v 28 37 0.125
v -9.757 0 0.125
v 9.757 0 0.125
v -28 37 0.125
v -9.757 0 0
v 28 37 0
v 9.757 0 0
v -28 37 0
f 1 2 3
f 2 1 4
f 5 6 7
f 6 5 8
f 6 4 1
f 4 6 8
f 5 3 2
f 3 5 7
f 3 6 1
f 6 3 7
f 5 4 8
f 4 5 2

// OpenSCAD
// file: modus.scad
//Corner Joint - allows the sides of two parts to create inlayed corner. Aids with welding.
//need to verify module math is the same throughout all parts.

module cornerjoint(Z,L,H,EndGap,PadL,PadH,CJangle,CJcenter){
    //change so that H = Z of inlayed part (usually 0.5)
    //add center and angle in degrees option, orgin far side of cut out area

     if((CJangle==0)&&(CJcenter==0))
      {    
        translate([0,0,0])
        rotate([0,0,CJangle])
        difference(){
        cube([L,H+PadH,Z]);
        translate([EndGap,H,0])
        cube([PadL,PadH,Z]);
        translate([L-EndGap-PadL,H,0])
        cube([PadL,PadH,Z]);}
      }    
else if((CJangle==90)&&(CJcenter==0))
      {    
        translate([H+PadH,0,0])
        rotate([0,0,CJangle])
        difference(){
        cube([L,H+PadH,Z]);
        translate([EndGap,H,0])
        cube([PadL,PadH,Z]);
        translate([L-EndGap-PadL,H,0])
        cube([PadL,PadH,Z]);}
      }
else if((CJangle==180)&&(CJcenter==0))       
      {    
        translate([L,H+PadH,0])
        rotate([0,0,CJangle])
        difference(){
        cube([L,H+PadH,Z]);
        translate([EndGap,H,0])
        cube([PadL,PadH,Z]);
        translate([L-EndGap-PadL,H,0])
        cube([PadL,PadH,Z]);}
      }
else if((CJangle==270)&&(CJcenter==0))
      {    
        translate([0,L,0])
        rotate([0,0,CJangle])
        difference(){
        cube([L,H+PadH,Z]);
        translate([EndGap,H,0])
        cube([PadL,PadH,Z]);
        translate([L-EndGap-PadL,H,0])
        cube([PadL,PadH,Z]);}
      }  
      
//centered     
   
else if((CJangle==0)&&(CJcenter==1))
      {    
        translate([-L/2,0,0])
        rotate([0,0,CJangle])
        difference(){
        cube([L,H+PadH,Z]);
        translate([EndGap,H,0])
        cube([PadL,PadH,Z]);
        translate([L-EndGap-PadL,H,0])
        cube([PadL,PadH,Z]);}
      }  
else if((CJangle==90)&&(CJcenter==1))
      {    
        translate([0,-L/2,0])
        rotate([0,0,CJangle])
        difference(){
        cube([L,H+PadH,Z]);
        translate([EndGap,H,0])
        cube([PadL,PadH,Z]);
        translate([L-EndGap-PadL,H,0])
        cube([PadL,PadH,Z]);}
      }
else if((CJangle==180)&&(CJcenter==1))       
      {    
        translate([L/2,0,0])
        rotate([0,0,CJangle])
        difference(){
        cube([L,H+PadH,Z]);
        translate([EndGap,H,0])
        cube([PadL,PadH,Z]);
        translate([L-EndGap-PadL,H,0])
        cube([PadL,PadH,Z]);}
      }
else if((CJangle==270)&&(CJcenter==1))
      {    
        translate([0,L/2,0])
        rotate([0,0,CJangle])
        difference(){
        cube([L,H+PadH,Z]);
        translate([EndGap,H,0])
        cube([PadL,PadH,Z]);
        translate([L-EndGap-PadL,H,0])
        cube([PadL,PadH,Z]);}
      }
} //end cornerjoint module

//Tab Insert - used to cut a hole for an abutting part to insert into. Typically aids with welding the two parts.
module tabinsert(X,Y,Z,dGap,cGap,c1,c2,c3,c4,c5,c6,c7,c8,center){
    translate([-dGap-(center*(X/2)),-dGap-(center*(Y/2)),0]){
        //main cut
        cube([X+(dGap*2),Y+(dGap*2),Z]);
        //corner c1c2
        translate([-cGap,(Y+(dGap*2))-c1+cGap,0])
            {
        cube([c2,c1,Z]);}
       //corner c3c4
       translate([(X+(dGap*2))-c3+cGap,(Y+(dGap*2))-c4+cGap,0]){
           cube([c3,c4,Z]);
       }
       //corner c5c6
       translate([(X+(dGap*2))-c6+cGap,-cGap,0])
      {
          cube([c6,c5,Z]);
      }
       
       //corner c7c8 
       translate([-cGap,-cGap,0]){
           cube([c7,c8,Z]);
       }
    
    } //end center translate
} //end tabinsert module
 

module nut(flattoflat,nutheight){  //distance from one flat side to the other flat side "A/F"

//typical sizes found here:
//https://en.wikipedia.org/wiki/Nut_(hardware)

difference(){
    translate([0,0,nutheight/2])
cube(size = [10,10,nutheight], center = true);
    
for(i=[1:6]){
    rotate([0,0,i*60])
difference(){
    translate([-10,0,0])
    cube([20,20,nutheight]);
    translate([-10,0,0])
    cube([20,flattoflat/2,nutheight]);
}  //end difference
}  //end for
}  //end differeence
}  //end module
// file: vars.scad
brickW=6; 
brickL=24;
brickCH=6; //Is brick height being shortened by d1z??

//3.625 x 2.25 x 8
//6 x 12 x 6

grateX=56;
grateY=23;
grateH=37; //Height mounted above press's frame
grateA=17.5; //angle of grate

//grateX=56;
//grateY=23;
//grateH=37; //Height mounted above press's frame
//grateA=17.5; //angle of grate


$fn=8; //defines resolution of circles. 8 is okay for review. 100  or greater should be used for for final dxf export.

dZstandard=0.5; //thickness of steel to be cut for drawer parts
fZstandard=0.5;
aZstandard=0.5; //thickness of steel to be cut for arm parts
hZstandard=0.125;

fBOLTHOLEstandardD=1; //standard bolts used on frame
aBOLTHOLEstandardD=1;

sliderodholeOD=1.2; 
d1bushingOD=1.25;
d1bushingL=1.25;
d1shaftOD=1;
d1bolt1OD=1;
d1bolt2OD=0.75;
d1nut2AF=1.25;
d1nut2H=0.665;


dGap=0.03125; //gap between a hole cut's edge and the part sitting within the hole. //D3 appears to use 0.3125, is this in error?

//all parts set to standard thickness below
//off standard preferences can be defined below

//drawer
drawergap=0.0283;  //extra room for drawer to slide in the space between f1 and f4
drawerHgap=0.1884;  //total extra space from drawer sides to frame walls. sum of both sides.

d2clevispinaccessholeOD=3;

d1z=dZstandard;
d2z=dZstandard;
d3z=dZstandard;
d4z=dZstandard;
d5z=dZstandard;
d6z=dZstandard;
d5z=dZstandard;
d7z=dZstandard;
d8z=dZstandard;
d9z=dZstandard;

d11z=dZstandard;
d12z=dZstandard;


//frame

f1y=6;
f1z=fZstandard;


f2y=3.5;
f2z=fZstandard;

f3y=3.5;
f3z=fZstandard;

f4y=11;
f4z=fZstandard;

f5y=3.5;
f5z=fZstandard;

f6y=8;
f6z=fZstandard;

f8y=brickW;
f8z=fZstandard;
f8boltD=1;

f9y=4.5;

f9z=fZstandard;




f12z=fZstandard;   

f11x=1.25;
f11z=fZstandard;

f13z=fZstandard;

f14y=3.5;
f14z=fZstandard;

//arms

a1x=4;
a1z=aZstandard;
a1out=24; //length from frame to A5 edge for bricks to sit on as they exit

a2x=6;
a2z=aZstandard;

a3x=4;
a3y=72;
a3z=aZstandard;

a4x=6;
a4y=72;
a4z=aZstandard;

a5x=6;
a5y=72;
a5z=aZstandard;

a6z=aZstandard;

//guards

h1x=grateX;
h1y=grateH;  //might need to tweak for grate thickness

h1z=hZstandard;
h2z=hZstandard;
h3z=hZstandard;
h4z=hZstandard;
h5z=hZstandard;
h6z=hZstandard;
h7z=hZstandard;
h8z=hZstandard;

//
//Input your main cylinder's dimenions here
//
cylMainBore = 5;
cylMainStroke = 16;
cylMainExt = 43;
cylMainRet = 27;
cylMainA = (cylMainRet-cylMainStroke); //center to center minus stroke length
cylMainB = 0.25; // cylinder wall thickness
cylMainD = 2.5; //Rod OD
cylMainE = 5.75; //rear pin holder width
cylMainG = 4; //rod pin holder width
cylMainJ = 3.8; //distance from the end of the cylinder body to rod pin center
cylMainR = 1.52; //pin hole ID
cylMainS = 2.5; //pin holder OD

//
//Input your drawer cylinder's dimenions here
//
//
cylDrawerBore = 5;
cylDrawerStroke = 16;
cylDrawerExt = 43;
cylDrawerRet = 27;
cylDrawerA = (cylMainRet-cylMainStroke); //center to center minus stroke length
cylDrawerB = 0.25; // cylinder wall thickness
cylDrawerD = 2.5; //Rod OD
cylDrawerE = 5.75; //rear pin holder width
cylDrawerG = 4; //rod pin holder width
cylDrawerJ = 3.8; //distance from the end of the cylinder body to rod pin center
cylDrawerR = 1.52; //pin hole ID
cylDrawerS = 2.5; //pin holder OD

cylinderDRAWERbodyH=3; //measured when in position, largest length from top to bottom of cylinder
cylinderDRAWERminC2C=0; //drawer's hydraulic cylinder's distance from the center of one mounting hole to the center of the other when fully compressed.
cylinderDRAWERmaxC2C=0; ///drawer's hydraulic cylinder's distance from the center of one mounting hole to the center of the other when fully extended.
cylinderDRAWERrodclevisW=2.5; //width of cylinders' clevis on end of rod
cylinderDRAWERrodclevisID=1;
cylinderDRAWERrodclevisOD=2;
cylinderDRAWERrearclevisW=2.5; //width of mounting clevis cylinder body
cylinderDRAWERrearclevisID=1;
cylinderDRAWERrearclevisOD=2;
cylinderDRAWERrearclevisClearance=3; //usable space around rear clevis pin (in diameter). be aware of hyraulic fittings.

//the following variables are calculated in order of dependence on preceding variables

d3x=brickL+(d2z*2);
d3y=brickCH-d1z;
d4x=brickW+d3z+d3z;
d4y=brickCH-d1z;
d5x=brickL+(d2z*2);
d5y=brickW;
d6x=brickL+(d2z*2);
d6y=brickCH;
d7x=cylinderDRAWERrearclevisClearance;
d7y=a4z+d8z+cylinderDRAWERbodyH;
d9x=cylinderDRAWERbodyH+d6z; //should be based on clevis size?
d9y=cylinderDRAWERbodyH+d8z;
d8x=brickL+(d2z*2);
d8y=max(5,(d9x-d6z));   //need to review fundamentals, 5 minimun unless d9 gets larger than d8
d11x=1.5+(d1bolt1OD*2)+d1bushingOD;
d11y=max((0.5+d1bushingL),4);

d12x=d8x;
d12y=d11y+1;

f1x=((brickL+(d2z*2)+drawerHgap+(f9y*2)));
f3x=f1x;

d1x=(brickL+d2z+d2z);
//d1x=(((f1x/2)-(((brickL+(d2z*2)+drawerHgap)/2)-fZstandard-(sliderodholeOD/2)))+(d11x/2))*2;
d1y=((brickW+d3z+d3z)*3)+1;

d2x=d8y+d6z+brickW+d3z+d5y+d3z;
d2y=brickCH;



f11y=f8y;
f6x=brickL+(d2z*2)+(f9y*2)+drawerHgap;

f9x=(f2z+((cylMainS+0.125)/2)+cylMainRet-cylMainJ+1+f4y+drawergap+d2y+f1y);  //leaves 1" between top of cylinder and bottom of F4
f8x=f9x;


f2x=brickL+(d2z*2)+drawerHgap+(f9y*2)-(1.4*2);  //distance between large cut outs in f9

f5x=brickL+(d2z*2)+drawerHgap+(f9y*2)+(a1x*2); //distance between outer edges of each A1

f4x=f5x-0.5;   //same as f5 but minus 0.25 on each side to give a little overhang

f14x=brickL+(1*2)+(.125*2)+(dGap*2); 

f12x=f3x;
f12y=(f3y*2)+brickW;

sliderodoffset=(((brickL+(d2z*2)+drawerHgap)/2)-fZstandard-(sliderodholeOD/2));

distancetof8center=(cylDrawerExt+(a4x/2)+((d9x-d6z)/2)+d6z+(brickW/2)); //F8 center on A1

a1y=distancetof8center+(brickW/2)+a1out;
a2y=a1y;

h7x=f5x-((a1x/2)*2)+(1.5*2);
h7y=cylDrawerStroke;

h8x=f5x-((a1x/2)*2)+(1.5*2);
h8y=a1out-a5x-f5y;  //distance between a5 and f5

hopperBaseX=brickL;
hopperBaseY=brickW;

h2x=grateX;
h2y=sqrt(((h1y-(sin(grateA)*grateY))*(h1y-(sin(grateA)*grateY)))+(((cos(grateA)*grateY)-hopperBaseY)*((cos(grateA)*grateY)-hopperBaseY)));

//h1y-(sin(grateA)*grateY)
//(cos(grateA)*grateY)-hopperBaseY

echo(h1y-(sin(grateA)*grateY));
echo((cos(grateA)*grateY)-hopperBaseY);
echo(h2y);
echo(atan((h1y-(sin(grateA)*grateY))/((cos(grateA)*grateY)-hopperBaseY)));
echo((h1y-(sin(grateA)*grateY))/(h1y));

// ECHO - REQUIRED PARTS BASED ON INPUTS

echo(str("Minimum drawer cylinder stroke length: ",(d3z*2)+d5y+brickW));
//would be cool to validate and confirm user inputed stroke length. set error=1; if drawer cylinder is not long enough. print an echo warning.

echo(str("Grate hieght above ground level: ",(1)));
// main file
include <vars.scad>;
use <modus.scad>;

h1p();

module h1p(){
    
hopperBaseS=hopperBaseX*((h1y-(sin(grateA)*grateY))/(h1y));
    
difference(){
    
translate([-(h1x/2),0,0])
cube([h1x,h1y,h1z]);    
translate([-(h1x/2),0,0])
cuts();
translate([(h1x/2),0,0])
mirror([1,0,0])
cuts();
} //end difference

module cuts(){

//angle of h2
//atan((h1y-(sin(grateA)*grateY))/((cos(grateA)*grateY)-hopperBaseY))

//z vector of h2 in assembly position
echo(sin(atan((h1y-(sin(grateA)*grateY))/((cos(grateA)*grateY)-hopperBaseY)))*h2y);    

//amount of x cut on one half of h2
//((h2x-hopperBaseX)/2)

//angle in the z-x plane
    echo("test");
echo(atan(((sin(atan((h1y-(sin(grateA)*grateY))/((cos(grateA)*grateY)-hopperBaseY)))*h2y))/(((h2x-hopperBaseX)/2))));

//draw someething at this angle

//h1x-(new x)

echo("new x");
echo(h1y/tan((atan(((sin(atan((h1y-(sin(grateA)*grateY))/((cos(grateA)*grateY)-hopperBaseY)))*h2y))/(((h2x-hopperBaseX)/2))))));
    

echo("new base");    
echo(h1x-((h1y/tan((atan(((sin(atan((h1y-(sin(grateA)*grateY))/((cos(grateA)*grateY)-hopperBaseY)))*h2y))/(((h2x-hopperBaseX)/2)))))))*2);    

//sin(atan(h1y/((h1x-hopperBaseX)/2)))*(h1x-hopperBaseX)/2

//sin(atan(h1y/((h1x-hopperBaseX)/2)))*h1y

//sqrt((((h1x-hopperBaseX)/2)*((h1x-hopperBaseX)/2))+((h1y)*(h1y)))

//angle of h2
//atan(h2y/((h2x-hopperBaseX)/2)) 
    
echo(atan((h2y*((h1y-(sin(grateA)*grateY))/(h1y)))/((h2x-hopperBaseX)/2)));

echo(h1y/tan((atan((h2y*((h1y-(sin(grateA)*grateY))/(h1y)))/((h2x-hopperBaseX)/2)))));
    
echo(h1x-((h1y/atan((atan((h2y*((h1y-(sin(grateA)*grateY))/(h1y)))/((h2x-hopperBaseX)/2)))))*2));

echo(hopperBaseS);

translate([h1x-((h1x-hopperBaseS)/2),0,0])
rotate([0,0,atan(h1y/((h1x-hopperBaseS)/2))])
    translate([0,-sin(atan(h1y/((h1x-hopperBaseS)/2)))*(h1x-hopperBaseS)/2,0])
#cube([sqrt((((h1x-hopperBaseS)/2)*((h1x-hopperBaseS)/2))+((h1y)*(h1y))),sin(atan(h1y/((h1x-hopperBaseS)/2)))*(h1x-hopperBaseS)/2,h1z]);
    
} //end cuts module
} //end h1p module
